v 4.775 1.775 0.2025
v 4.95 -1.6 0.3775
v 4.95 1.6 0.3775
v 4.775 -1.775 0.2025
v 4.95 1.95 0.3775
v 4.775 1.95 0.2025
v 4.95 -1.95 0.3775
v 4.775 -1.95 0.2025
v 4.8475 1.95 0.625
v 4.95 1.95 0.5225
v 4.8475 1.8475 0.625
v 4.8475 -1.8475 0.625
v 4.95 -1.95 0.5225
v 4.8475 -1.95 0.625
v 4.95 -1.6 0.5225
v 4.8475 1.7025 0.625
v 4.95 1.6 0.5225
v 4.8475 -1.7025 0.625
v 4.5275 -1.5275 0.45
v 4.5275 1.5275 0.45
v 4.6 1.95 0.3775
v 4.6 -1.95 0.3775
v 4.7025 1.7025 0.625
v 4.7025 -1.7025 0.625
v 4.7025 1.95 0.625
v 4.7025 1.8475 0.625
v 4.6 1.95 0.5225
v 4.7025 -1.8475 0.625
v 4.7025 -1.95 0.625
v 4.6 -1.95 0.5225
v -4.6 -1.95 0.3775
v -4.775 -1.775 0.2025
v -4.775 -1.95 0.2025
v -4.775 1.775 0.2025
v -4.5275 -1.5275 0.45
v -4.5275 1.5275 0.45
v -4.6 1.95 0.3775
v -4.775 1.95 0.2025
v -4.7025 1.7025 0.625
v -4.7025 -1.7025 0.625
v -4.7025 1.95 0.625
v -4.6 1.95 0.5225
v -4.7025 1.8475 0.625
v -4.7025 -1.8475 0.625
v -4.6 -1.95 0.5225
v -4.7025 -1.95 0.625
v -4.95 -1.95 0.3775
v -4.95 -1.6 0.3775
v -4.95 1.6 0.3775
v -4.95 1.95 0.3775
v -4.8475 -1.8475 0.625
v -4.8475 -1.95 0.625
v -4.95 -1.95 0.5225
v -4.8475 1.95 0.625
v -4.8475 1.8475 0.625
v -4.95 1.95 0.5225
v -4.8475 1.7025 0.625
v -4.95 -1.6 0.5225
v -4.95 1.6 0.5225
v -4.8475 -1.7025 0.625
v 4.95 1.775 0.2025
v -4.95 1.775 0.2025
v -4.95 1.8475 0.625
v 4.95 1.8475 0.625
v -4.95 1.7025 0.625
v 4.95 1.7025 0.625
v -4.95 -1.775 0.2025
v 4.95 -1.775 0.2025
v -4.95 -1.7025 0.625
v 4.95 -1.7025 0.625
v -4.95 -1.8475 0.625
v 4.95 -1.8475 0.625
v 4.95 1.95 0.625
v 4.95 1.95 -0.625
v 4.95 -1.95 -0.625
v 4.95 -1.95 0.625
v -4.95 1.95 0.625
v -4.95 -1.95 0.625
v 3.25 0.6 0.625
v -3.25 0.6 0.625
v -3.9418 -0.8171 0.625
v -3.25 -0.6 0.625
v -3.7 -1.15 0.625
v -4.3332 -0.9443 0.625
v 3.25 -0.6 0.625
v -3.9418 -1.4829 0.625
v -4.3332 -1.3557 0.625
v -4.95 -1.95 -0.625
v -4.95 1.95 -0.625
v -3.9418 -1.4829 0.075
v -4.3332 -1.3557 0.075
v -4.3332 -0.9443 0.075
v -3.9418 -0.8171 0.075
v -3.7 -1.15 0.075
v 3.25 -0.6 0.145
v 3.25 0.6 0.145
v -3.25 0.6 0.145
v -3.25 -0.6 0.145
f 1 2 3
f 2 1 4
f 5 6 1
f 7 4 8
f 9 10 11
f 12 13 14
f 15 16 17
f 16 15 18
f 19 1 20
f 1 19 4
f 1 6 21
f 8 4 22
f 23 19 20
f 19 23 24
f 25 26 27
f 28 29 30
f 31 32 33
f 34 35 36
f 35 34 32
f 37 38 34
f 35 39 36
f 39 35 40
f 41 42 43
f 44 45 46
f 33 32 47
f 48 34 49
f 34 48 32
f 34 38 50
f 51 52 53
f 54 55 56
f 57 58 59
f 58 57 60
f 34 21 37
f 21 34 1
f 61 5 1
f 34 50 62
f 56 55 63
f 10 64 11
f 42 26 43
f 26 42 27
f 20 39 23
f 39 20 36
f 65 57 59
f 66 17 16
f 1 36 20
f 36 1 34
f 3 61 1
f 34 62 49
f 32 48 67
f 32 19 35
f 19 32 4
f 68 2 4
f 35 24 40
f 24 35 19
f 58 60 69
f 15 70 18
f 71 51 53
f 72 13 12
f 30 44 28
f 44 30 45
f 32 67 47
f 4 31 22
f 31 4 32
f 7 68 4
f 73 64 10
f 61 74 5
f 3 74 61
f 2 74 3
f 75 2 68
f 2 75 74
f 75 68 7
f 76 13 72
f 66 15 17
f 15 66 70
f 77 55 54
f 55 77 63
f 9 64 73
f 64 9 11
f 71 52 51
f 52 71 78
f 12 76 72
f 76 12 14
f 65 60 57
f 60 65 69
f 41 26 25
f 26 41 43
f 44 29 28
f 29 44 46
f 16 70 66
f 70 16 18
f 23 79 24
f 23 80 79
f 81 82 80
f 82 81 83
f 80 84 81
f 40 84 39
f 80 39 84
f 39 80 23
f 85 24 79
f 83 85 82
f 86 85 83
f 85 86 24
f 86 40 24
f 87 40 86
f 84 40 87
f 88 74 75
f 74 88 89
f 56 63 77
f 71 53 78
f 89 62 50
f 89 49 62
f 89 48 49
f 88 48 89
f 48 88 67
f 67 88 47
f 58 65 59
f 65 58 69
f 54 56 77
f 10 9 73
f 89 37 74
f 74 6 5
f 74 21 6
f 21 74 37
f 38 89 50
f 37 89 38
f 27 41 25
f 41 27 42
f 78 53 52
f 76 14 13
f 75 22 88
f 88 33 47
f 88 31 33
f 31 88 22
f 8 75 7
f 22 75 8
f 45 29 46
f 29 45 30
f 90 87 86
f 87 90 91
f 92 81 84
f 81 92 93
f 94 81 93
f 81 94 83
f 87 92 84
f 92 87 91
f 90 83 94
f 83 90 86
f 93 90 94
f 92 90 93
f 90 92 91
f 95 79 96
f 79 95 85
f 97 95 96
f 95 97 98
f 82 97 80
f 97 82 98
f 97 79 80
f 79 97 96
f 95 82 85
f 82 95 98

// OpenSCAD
// Parameters
body_length = 9.9; //[5:20:0.1]
body_width = 3.9; //[2:8:0.1]
body_height = 1.25; //[0.6:2.5:0.05]
edge_chamfer_size = 0.35; //[0.15:0.8:0.05]
pin_mark_radius = 0.35; //[0.15:0.8:0.05]
pin_mark_depth = 0.15; //[0.05:0.4:0.05]
pin_mark_inset_x = 0.9; //[0.4:2:0.1]
pin_mark_inset_y = 0.8; //[0.4:2:0.1]
top_mark_length = 6.5; //[3:12:0.1]
top_mark_width = 1.2; //[0.5:3:0.1]
top_mark_depth = 0.08; //[0.03:0.25:0.01]
overlap = 0.8; //[0.5:2:0.1]

// Base shapes
module smd_body() {
  color("DimGray")
  cube([body_length, body_width, body_height], center=true);
}

module pin_mark() {
  translate([-body_length/2 + pin_mark_inset_x, -body_width/2 + pin_mark_inset_y, body_height/2 - pin_mark_depth/2])
  cylinder(h=pin_mark_depth + overlap, r=pin_mark_radius, center=true);
}

module top_marking() {
  translate([0, 0, body_height/2 - top_mark_depth/2])
  cube([top_mark_length, top_mark_width, top_mark_depth + overlap], center=true);
}

module edge_chamfer_x_pos() {
  translate([body_length/2 - edge_chamfer_size/2, 0, body_height/2 - edge_chamfer_size/2])
  rotate([0, 45, 0])
  cube([edge_chamfer_size, body_width + overlap, edge_chamfer_size], center=true);
}

module edge_chamfer_x_neg() {
  translate([-body_length/2 + edge_chamfer_size/2, 0, body_height/2 - edge_chamfer_size/2])
  rotate([0, 45, 0])
  cube([edge_chamfer_size, body_width + overlap, edge_chamfer_size], center=true);
}

module edge_chamfer_y_pos() {
  translate([0, body_width/2 - edge_chamfer_size/2, body_height/2 - edge_chamfer_size/2])
  rotate([45, 0, 0])
  cube([body_length + overlap, edge_chamfer_size, edge_chamfer_size], center=true);
}

module edge_chamfer_y_neg() {
  translate([0, -body_width/2 + edge_chamfer_size/2, body_height/2 - edge_chamfer_size/2])
  rotate([45, 0, 0])
  cube([body_length + overlap, edge_chamfer_size, edge_chamfer_size], center=true);
}

// Operations
module edge_chamfer() {
  union() {
    edge_chamfer_x_pos();
    edge_chamfer_x_neg();
    edge_chamfer_y_pos();
    edge_chamfer_y_neg();
  }
}

module smd_with_features() {
  difference() {
    smd_body();
    edge_chamfer();
    pin_mark();
    top_marking();
  }
}

// Final output
smd_with_features();
